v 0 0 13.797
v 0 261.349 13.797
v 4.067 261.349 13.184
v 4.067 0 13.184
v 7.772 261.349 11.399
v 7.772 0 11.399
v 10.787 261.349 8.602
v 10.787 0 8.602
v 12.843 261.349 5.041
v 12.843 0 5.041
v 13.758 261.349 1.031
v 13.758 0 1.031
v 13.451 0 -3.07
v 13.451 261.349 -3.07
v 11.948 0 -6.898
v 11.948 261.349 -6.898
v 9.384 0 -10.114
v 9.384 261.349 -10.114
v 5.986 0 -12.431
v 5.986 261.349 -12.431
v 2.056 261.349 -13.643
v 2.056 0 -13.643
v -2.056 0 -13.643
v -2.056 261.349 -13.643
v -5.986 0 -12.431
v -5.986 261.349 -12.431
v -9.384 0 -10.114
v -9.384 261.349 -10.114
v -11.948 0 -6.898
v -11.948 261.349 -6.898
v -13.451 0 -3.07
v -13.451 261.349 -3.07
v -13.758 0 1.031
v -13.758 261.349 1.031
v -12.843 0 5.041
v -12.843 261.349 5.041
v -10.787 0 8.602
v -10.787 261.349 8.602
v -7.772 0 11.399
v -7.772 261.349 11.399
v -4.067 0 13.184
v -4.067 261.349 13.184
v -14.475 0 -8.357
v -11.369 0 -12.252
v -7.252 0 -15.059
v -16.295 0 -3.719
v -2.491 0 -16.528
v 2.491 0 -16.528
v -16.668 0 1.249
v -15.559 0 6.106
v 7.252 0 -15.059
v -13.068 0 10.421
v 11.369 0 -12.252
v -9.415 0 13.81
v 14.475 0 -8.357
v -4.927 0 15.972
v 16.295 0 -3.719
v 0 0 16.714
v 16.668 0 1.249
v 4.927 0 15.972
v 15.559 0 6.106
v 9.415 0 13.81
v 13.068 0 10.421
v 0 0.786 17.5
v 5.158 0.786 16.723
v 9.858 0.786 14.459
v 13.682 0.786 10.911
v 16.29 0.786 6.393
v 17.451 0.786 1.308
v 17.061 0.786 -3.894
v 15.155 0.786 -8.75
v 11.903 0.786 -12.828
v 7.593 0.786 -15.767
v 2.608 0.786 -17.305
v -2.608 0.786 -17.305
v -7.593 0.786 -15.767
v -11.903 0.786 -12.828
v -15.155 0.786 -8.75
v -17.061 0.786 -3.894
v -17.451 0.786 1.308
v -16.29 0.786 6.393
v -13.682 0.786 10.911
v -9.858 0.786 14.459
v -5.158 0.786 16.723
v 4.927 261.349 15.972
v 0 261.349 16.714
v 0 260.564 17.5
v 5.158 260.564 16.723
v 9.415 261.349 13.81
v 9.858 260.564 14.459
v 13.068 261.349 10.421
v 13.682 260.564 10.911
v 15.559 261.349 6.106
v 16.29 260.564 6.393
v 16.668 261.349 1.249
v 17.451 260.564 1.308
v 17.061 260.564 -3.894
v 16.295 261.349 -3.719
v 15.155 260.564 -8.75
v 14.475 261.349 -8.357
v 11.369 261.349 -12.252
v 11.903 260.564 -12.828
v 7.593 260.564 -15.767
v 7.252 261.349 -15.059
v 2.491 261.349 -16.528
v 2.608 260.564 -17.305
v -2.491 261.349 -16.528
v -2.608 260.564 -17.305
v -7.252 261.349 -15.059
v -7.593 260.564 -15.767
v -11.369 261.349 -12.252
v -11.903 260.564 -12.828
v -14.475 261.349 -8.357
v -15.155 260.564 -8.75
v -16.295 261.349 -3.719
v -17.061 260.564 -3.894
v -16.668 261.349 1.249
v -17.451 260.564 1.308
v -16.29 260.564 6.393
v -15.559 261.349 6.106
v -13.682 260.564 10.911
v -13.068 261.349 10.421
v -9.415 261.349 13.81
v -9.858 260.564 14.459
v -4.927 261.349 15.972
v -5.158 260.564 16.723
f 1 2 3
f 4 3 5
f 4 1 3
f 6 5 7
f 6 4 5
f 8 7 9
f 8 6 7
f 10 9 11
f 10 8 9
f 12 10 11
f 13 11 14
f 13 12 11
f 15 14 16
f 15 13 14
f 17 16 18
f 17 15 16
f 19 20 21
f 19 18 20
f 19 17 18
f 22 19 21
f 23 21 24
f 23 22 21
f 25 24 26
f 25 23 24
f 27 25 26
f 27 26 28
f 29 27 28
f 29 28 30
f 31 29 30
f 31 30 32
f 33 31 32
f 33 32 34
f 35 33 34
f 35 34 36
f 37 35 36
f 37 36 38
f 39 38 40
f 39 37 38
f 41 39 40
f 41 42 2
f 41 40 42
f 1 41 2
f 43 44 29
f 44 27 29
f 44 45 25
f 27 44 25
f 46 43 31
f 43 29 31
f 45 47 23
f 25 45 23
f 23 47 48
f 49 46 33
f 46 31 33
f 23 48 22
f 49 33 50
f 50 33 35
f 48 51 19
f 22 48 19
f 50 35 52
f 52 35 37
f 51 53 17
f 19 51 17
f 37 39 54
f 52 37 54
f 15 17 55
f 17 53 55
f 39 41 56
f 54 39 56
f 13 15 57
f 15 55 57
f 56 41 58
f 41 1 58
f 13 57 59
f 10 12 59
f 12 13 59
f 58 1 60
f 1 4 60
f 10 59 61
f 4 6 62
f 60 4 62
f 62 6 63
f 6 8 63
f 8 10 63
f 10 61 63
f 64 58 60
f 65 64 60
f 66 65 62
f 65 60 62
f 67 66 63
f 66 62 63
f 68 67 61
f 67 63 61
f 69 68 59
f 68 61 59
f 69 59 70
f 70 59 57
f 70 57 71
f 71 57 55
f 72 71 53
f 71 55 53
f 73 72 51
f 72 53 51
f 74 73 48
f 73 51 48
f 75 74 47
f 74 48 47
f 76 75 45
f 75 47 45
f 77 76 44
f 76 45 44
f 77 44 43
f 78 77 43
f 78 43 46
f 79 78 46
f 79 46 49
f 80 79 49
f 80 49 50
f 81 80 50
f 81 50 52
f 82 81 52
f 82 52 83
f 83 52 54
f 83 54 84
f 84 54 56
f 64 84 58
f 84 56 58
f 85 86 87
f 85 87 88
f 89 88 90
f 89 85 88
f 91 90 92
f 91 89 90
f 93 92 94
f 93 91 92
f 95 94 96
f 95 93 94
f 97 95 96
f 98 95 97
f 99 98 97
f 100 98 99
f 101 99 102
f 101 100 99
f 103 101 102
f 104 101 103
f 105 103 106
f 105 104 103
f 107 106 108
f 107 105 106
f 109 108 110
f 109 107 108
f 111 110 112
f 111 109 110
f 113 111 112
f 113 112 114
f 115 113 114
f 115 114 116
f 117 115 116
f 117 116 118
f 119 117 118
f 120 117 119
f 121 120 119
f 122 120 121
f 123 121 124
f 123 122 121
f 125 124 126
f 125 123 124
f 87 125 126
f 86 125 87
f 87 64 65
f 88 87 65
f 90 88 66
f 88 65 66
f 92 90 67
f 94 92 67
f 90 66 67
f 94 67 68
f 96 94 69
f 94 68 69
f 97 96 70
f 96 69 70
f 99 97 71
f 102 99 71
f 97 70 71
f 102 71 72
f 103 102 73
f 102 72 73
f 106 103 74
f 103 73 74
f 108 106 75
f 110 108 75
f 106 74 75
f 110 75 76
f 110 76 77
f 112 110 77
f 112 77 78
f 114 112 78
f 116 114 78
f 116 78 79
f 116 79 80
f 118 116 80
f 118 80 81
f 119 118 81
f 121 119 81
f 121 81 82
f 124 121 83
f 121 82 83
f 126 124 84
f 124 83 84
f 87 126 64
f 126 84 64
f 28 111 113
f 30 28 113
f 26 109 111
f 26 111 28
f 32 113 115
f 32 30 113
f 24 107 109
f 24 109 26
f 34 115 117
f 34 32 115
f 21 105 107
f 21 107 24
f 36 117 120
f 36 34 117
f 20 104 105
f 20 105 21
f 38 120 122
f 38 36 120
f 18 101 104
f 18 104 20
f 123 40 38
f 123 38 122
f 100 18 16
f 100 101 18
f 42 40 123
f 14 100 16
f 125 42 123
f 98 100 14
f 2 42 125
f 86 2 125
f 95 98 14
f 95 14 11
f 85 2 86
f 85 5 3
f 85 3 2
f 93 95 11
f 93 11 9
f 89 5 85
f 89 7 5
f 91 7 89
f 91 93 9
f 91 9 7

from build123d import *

# Parameters (mm, degrees)
SKETCH1_R           = 17.5
BOSS_EXTRUDE1_DEPTH = 261.349292026
SKETCH2_R           = 13.796851261
CUT_EXTRUDE1_DEPTH  = 263.518480192
CHAMFER1_SIZE       = 0.785713561


with BuildPart() as part:
    # Sketch1 → Boss-Extrude1 (new body)
    with BuildSketch(Plane(origin=(0, 0, 0), x_dir=(1, 0, 0), z_dir=(0, 1, 0))):
        Circle(SKETCH1_R)
    extrude(amount=BOSS_EXTRUDE1_DEPTH)

    # Sketch2 → Cut-Extrude1 (cut, through all)
    with BuildSketch(Plane(origin=(0, 0, 0), x_dir=(1, 0, 0), z_dir=(0, 1, 0))):
        Circle(SKETCH2_R)
    extrude(amount=CUT_EXTRUDE1_DEPTH, mode=Mode.SUBTRACT)

    # Chamfer1
    chamfer1_edges = [part.edges().sort_by_distance(p)[0] for p in [
        (-17.5, 261.349292026, 0),
        (-17.5, 0, 0),
    ]]
    chamfer(chamfer1_edges, length=CHAMFER1_SIZE)


solid = part.part
